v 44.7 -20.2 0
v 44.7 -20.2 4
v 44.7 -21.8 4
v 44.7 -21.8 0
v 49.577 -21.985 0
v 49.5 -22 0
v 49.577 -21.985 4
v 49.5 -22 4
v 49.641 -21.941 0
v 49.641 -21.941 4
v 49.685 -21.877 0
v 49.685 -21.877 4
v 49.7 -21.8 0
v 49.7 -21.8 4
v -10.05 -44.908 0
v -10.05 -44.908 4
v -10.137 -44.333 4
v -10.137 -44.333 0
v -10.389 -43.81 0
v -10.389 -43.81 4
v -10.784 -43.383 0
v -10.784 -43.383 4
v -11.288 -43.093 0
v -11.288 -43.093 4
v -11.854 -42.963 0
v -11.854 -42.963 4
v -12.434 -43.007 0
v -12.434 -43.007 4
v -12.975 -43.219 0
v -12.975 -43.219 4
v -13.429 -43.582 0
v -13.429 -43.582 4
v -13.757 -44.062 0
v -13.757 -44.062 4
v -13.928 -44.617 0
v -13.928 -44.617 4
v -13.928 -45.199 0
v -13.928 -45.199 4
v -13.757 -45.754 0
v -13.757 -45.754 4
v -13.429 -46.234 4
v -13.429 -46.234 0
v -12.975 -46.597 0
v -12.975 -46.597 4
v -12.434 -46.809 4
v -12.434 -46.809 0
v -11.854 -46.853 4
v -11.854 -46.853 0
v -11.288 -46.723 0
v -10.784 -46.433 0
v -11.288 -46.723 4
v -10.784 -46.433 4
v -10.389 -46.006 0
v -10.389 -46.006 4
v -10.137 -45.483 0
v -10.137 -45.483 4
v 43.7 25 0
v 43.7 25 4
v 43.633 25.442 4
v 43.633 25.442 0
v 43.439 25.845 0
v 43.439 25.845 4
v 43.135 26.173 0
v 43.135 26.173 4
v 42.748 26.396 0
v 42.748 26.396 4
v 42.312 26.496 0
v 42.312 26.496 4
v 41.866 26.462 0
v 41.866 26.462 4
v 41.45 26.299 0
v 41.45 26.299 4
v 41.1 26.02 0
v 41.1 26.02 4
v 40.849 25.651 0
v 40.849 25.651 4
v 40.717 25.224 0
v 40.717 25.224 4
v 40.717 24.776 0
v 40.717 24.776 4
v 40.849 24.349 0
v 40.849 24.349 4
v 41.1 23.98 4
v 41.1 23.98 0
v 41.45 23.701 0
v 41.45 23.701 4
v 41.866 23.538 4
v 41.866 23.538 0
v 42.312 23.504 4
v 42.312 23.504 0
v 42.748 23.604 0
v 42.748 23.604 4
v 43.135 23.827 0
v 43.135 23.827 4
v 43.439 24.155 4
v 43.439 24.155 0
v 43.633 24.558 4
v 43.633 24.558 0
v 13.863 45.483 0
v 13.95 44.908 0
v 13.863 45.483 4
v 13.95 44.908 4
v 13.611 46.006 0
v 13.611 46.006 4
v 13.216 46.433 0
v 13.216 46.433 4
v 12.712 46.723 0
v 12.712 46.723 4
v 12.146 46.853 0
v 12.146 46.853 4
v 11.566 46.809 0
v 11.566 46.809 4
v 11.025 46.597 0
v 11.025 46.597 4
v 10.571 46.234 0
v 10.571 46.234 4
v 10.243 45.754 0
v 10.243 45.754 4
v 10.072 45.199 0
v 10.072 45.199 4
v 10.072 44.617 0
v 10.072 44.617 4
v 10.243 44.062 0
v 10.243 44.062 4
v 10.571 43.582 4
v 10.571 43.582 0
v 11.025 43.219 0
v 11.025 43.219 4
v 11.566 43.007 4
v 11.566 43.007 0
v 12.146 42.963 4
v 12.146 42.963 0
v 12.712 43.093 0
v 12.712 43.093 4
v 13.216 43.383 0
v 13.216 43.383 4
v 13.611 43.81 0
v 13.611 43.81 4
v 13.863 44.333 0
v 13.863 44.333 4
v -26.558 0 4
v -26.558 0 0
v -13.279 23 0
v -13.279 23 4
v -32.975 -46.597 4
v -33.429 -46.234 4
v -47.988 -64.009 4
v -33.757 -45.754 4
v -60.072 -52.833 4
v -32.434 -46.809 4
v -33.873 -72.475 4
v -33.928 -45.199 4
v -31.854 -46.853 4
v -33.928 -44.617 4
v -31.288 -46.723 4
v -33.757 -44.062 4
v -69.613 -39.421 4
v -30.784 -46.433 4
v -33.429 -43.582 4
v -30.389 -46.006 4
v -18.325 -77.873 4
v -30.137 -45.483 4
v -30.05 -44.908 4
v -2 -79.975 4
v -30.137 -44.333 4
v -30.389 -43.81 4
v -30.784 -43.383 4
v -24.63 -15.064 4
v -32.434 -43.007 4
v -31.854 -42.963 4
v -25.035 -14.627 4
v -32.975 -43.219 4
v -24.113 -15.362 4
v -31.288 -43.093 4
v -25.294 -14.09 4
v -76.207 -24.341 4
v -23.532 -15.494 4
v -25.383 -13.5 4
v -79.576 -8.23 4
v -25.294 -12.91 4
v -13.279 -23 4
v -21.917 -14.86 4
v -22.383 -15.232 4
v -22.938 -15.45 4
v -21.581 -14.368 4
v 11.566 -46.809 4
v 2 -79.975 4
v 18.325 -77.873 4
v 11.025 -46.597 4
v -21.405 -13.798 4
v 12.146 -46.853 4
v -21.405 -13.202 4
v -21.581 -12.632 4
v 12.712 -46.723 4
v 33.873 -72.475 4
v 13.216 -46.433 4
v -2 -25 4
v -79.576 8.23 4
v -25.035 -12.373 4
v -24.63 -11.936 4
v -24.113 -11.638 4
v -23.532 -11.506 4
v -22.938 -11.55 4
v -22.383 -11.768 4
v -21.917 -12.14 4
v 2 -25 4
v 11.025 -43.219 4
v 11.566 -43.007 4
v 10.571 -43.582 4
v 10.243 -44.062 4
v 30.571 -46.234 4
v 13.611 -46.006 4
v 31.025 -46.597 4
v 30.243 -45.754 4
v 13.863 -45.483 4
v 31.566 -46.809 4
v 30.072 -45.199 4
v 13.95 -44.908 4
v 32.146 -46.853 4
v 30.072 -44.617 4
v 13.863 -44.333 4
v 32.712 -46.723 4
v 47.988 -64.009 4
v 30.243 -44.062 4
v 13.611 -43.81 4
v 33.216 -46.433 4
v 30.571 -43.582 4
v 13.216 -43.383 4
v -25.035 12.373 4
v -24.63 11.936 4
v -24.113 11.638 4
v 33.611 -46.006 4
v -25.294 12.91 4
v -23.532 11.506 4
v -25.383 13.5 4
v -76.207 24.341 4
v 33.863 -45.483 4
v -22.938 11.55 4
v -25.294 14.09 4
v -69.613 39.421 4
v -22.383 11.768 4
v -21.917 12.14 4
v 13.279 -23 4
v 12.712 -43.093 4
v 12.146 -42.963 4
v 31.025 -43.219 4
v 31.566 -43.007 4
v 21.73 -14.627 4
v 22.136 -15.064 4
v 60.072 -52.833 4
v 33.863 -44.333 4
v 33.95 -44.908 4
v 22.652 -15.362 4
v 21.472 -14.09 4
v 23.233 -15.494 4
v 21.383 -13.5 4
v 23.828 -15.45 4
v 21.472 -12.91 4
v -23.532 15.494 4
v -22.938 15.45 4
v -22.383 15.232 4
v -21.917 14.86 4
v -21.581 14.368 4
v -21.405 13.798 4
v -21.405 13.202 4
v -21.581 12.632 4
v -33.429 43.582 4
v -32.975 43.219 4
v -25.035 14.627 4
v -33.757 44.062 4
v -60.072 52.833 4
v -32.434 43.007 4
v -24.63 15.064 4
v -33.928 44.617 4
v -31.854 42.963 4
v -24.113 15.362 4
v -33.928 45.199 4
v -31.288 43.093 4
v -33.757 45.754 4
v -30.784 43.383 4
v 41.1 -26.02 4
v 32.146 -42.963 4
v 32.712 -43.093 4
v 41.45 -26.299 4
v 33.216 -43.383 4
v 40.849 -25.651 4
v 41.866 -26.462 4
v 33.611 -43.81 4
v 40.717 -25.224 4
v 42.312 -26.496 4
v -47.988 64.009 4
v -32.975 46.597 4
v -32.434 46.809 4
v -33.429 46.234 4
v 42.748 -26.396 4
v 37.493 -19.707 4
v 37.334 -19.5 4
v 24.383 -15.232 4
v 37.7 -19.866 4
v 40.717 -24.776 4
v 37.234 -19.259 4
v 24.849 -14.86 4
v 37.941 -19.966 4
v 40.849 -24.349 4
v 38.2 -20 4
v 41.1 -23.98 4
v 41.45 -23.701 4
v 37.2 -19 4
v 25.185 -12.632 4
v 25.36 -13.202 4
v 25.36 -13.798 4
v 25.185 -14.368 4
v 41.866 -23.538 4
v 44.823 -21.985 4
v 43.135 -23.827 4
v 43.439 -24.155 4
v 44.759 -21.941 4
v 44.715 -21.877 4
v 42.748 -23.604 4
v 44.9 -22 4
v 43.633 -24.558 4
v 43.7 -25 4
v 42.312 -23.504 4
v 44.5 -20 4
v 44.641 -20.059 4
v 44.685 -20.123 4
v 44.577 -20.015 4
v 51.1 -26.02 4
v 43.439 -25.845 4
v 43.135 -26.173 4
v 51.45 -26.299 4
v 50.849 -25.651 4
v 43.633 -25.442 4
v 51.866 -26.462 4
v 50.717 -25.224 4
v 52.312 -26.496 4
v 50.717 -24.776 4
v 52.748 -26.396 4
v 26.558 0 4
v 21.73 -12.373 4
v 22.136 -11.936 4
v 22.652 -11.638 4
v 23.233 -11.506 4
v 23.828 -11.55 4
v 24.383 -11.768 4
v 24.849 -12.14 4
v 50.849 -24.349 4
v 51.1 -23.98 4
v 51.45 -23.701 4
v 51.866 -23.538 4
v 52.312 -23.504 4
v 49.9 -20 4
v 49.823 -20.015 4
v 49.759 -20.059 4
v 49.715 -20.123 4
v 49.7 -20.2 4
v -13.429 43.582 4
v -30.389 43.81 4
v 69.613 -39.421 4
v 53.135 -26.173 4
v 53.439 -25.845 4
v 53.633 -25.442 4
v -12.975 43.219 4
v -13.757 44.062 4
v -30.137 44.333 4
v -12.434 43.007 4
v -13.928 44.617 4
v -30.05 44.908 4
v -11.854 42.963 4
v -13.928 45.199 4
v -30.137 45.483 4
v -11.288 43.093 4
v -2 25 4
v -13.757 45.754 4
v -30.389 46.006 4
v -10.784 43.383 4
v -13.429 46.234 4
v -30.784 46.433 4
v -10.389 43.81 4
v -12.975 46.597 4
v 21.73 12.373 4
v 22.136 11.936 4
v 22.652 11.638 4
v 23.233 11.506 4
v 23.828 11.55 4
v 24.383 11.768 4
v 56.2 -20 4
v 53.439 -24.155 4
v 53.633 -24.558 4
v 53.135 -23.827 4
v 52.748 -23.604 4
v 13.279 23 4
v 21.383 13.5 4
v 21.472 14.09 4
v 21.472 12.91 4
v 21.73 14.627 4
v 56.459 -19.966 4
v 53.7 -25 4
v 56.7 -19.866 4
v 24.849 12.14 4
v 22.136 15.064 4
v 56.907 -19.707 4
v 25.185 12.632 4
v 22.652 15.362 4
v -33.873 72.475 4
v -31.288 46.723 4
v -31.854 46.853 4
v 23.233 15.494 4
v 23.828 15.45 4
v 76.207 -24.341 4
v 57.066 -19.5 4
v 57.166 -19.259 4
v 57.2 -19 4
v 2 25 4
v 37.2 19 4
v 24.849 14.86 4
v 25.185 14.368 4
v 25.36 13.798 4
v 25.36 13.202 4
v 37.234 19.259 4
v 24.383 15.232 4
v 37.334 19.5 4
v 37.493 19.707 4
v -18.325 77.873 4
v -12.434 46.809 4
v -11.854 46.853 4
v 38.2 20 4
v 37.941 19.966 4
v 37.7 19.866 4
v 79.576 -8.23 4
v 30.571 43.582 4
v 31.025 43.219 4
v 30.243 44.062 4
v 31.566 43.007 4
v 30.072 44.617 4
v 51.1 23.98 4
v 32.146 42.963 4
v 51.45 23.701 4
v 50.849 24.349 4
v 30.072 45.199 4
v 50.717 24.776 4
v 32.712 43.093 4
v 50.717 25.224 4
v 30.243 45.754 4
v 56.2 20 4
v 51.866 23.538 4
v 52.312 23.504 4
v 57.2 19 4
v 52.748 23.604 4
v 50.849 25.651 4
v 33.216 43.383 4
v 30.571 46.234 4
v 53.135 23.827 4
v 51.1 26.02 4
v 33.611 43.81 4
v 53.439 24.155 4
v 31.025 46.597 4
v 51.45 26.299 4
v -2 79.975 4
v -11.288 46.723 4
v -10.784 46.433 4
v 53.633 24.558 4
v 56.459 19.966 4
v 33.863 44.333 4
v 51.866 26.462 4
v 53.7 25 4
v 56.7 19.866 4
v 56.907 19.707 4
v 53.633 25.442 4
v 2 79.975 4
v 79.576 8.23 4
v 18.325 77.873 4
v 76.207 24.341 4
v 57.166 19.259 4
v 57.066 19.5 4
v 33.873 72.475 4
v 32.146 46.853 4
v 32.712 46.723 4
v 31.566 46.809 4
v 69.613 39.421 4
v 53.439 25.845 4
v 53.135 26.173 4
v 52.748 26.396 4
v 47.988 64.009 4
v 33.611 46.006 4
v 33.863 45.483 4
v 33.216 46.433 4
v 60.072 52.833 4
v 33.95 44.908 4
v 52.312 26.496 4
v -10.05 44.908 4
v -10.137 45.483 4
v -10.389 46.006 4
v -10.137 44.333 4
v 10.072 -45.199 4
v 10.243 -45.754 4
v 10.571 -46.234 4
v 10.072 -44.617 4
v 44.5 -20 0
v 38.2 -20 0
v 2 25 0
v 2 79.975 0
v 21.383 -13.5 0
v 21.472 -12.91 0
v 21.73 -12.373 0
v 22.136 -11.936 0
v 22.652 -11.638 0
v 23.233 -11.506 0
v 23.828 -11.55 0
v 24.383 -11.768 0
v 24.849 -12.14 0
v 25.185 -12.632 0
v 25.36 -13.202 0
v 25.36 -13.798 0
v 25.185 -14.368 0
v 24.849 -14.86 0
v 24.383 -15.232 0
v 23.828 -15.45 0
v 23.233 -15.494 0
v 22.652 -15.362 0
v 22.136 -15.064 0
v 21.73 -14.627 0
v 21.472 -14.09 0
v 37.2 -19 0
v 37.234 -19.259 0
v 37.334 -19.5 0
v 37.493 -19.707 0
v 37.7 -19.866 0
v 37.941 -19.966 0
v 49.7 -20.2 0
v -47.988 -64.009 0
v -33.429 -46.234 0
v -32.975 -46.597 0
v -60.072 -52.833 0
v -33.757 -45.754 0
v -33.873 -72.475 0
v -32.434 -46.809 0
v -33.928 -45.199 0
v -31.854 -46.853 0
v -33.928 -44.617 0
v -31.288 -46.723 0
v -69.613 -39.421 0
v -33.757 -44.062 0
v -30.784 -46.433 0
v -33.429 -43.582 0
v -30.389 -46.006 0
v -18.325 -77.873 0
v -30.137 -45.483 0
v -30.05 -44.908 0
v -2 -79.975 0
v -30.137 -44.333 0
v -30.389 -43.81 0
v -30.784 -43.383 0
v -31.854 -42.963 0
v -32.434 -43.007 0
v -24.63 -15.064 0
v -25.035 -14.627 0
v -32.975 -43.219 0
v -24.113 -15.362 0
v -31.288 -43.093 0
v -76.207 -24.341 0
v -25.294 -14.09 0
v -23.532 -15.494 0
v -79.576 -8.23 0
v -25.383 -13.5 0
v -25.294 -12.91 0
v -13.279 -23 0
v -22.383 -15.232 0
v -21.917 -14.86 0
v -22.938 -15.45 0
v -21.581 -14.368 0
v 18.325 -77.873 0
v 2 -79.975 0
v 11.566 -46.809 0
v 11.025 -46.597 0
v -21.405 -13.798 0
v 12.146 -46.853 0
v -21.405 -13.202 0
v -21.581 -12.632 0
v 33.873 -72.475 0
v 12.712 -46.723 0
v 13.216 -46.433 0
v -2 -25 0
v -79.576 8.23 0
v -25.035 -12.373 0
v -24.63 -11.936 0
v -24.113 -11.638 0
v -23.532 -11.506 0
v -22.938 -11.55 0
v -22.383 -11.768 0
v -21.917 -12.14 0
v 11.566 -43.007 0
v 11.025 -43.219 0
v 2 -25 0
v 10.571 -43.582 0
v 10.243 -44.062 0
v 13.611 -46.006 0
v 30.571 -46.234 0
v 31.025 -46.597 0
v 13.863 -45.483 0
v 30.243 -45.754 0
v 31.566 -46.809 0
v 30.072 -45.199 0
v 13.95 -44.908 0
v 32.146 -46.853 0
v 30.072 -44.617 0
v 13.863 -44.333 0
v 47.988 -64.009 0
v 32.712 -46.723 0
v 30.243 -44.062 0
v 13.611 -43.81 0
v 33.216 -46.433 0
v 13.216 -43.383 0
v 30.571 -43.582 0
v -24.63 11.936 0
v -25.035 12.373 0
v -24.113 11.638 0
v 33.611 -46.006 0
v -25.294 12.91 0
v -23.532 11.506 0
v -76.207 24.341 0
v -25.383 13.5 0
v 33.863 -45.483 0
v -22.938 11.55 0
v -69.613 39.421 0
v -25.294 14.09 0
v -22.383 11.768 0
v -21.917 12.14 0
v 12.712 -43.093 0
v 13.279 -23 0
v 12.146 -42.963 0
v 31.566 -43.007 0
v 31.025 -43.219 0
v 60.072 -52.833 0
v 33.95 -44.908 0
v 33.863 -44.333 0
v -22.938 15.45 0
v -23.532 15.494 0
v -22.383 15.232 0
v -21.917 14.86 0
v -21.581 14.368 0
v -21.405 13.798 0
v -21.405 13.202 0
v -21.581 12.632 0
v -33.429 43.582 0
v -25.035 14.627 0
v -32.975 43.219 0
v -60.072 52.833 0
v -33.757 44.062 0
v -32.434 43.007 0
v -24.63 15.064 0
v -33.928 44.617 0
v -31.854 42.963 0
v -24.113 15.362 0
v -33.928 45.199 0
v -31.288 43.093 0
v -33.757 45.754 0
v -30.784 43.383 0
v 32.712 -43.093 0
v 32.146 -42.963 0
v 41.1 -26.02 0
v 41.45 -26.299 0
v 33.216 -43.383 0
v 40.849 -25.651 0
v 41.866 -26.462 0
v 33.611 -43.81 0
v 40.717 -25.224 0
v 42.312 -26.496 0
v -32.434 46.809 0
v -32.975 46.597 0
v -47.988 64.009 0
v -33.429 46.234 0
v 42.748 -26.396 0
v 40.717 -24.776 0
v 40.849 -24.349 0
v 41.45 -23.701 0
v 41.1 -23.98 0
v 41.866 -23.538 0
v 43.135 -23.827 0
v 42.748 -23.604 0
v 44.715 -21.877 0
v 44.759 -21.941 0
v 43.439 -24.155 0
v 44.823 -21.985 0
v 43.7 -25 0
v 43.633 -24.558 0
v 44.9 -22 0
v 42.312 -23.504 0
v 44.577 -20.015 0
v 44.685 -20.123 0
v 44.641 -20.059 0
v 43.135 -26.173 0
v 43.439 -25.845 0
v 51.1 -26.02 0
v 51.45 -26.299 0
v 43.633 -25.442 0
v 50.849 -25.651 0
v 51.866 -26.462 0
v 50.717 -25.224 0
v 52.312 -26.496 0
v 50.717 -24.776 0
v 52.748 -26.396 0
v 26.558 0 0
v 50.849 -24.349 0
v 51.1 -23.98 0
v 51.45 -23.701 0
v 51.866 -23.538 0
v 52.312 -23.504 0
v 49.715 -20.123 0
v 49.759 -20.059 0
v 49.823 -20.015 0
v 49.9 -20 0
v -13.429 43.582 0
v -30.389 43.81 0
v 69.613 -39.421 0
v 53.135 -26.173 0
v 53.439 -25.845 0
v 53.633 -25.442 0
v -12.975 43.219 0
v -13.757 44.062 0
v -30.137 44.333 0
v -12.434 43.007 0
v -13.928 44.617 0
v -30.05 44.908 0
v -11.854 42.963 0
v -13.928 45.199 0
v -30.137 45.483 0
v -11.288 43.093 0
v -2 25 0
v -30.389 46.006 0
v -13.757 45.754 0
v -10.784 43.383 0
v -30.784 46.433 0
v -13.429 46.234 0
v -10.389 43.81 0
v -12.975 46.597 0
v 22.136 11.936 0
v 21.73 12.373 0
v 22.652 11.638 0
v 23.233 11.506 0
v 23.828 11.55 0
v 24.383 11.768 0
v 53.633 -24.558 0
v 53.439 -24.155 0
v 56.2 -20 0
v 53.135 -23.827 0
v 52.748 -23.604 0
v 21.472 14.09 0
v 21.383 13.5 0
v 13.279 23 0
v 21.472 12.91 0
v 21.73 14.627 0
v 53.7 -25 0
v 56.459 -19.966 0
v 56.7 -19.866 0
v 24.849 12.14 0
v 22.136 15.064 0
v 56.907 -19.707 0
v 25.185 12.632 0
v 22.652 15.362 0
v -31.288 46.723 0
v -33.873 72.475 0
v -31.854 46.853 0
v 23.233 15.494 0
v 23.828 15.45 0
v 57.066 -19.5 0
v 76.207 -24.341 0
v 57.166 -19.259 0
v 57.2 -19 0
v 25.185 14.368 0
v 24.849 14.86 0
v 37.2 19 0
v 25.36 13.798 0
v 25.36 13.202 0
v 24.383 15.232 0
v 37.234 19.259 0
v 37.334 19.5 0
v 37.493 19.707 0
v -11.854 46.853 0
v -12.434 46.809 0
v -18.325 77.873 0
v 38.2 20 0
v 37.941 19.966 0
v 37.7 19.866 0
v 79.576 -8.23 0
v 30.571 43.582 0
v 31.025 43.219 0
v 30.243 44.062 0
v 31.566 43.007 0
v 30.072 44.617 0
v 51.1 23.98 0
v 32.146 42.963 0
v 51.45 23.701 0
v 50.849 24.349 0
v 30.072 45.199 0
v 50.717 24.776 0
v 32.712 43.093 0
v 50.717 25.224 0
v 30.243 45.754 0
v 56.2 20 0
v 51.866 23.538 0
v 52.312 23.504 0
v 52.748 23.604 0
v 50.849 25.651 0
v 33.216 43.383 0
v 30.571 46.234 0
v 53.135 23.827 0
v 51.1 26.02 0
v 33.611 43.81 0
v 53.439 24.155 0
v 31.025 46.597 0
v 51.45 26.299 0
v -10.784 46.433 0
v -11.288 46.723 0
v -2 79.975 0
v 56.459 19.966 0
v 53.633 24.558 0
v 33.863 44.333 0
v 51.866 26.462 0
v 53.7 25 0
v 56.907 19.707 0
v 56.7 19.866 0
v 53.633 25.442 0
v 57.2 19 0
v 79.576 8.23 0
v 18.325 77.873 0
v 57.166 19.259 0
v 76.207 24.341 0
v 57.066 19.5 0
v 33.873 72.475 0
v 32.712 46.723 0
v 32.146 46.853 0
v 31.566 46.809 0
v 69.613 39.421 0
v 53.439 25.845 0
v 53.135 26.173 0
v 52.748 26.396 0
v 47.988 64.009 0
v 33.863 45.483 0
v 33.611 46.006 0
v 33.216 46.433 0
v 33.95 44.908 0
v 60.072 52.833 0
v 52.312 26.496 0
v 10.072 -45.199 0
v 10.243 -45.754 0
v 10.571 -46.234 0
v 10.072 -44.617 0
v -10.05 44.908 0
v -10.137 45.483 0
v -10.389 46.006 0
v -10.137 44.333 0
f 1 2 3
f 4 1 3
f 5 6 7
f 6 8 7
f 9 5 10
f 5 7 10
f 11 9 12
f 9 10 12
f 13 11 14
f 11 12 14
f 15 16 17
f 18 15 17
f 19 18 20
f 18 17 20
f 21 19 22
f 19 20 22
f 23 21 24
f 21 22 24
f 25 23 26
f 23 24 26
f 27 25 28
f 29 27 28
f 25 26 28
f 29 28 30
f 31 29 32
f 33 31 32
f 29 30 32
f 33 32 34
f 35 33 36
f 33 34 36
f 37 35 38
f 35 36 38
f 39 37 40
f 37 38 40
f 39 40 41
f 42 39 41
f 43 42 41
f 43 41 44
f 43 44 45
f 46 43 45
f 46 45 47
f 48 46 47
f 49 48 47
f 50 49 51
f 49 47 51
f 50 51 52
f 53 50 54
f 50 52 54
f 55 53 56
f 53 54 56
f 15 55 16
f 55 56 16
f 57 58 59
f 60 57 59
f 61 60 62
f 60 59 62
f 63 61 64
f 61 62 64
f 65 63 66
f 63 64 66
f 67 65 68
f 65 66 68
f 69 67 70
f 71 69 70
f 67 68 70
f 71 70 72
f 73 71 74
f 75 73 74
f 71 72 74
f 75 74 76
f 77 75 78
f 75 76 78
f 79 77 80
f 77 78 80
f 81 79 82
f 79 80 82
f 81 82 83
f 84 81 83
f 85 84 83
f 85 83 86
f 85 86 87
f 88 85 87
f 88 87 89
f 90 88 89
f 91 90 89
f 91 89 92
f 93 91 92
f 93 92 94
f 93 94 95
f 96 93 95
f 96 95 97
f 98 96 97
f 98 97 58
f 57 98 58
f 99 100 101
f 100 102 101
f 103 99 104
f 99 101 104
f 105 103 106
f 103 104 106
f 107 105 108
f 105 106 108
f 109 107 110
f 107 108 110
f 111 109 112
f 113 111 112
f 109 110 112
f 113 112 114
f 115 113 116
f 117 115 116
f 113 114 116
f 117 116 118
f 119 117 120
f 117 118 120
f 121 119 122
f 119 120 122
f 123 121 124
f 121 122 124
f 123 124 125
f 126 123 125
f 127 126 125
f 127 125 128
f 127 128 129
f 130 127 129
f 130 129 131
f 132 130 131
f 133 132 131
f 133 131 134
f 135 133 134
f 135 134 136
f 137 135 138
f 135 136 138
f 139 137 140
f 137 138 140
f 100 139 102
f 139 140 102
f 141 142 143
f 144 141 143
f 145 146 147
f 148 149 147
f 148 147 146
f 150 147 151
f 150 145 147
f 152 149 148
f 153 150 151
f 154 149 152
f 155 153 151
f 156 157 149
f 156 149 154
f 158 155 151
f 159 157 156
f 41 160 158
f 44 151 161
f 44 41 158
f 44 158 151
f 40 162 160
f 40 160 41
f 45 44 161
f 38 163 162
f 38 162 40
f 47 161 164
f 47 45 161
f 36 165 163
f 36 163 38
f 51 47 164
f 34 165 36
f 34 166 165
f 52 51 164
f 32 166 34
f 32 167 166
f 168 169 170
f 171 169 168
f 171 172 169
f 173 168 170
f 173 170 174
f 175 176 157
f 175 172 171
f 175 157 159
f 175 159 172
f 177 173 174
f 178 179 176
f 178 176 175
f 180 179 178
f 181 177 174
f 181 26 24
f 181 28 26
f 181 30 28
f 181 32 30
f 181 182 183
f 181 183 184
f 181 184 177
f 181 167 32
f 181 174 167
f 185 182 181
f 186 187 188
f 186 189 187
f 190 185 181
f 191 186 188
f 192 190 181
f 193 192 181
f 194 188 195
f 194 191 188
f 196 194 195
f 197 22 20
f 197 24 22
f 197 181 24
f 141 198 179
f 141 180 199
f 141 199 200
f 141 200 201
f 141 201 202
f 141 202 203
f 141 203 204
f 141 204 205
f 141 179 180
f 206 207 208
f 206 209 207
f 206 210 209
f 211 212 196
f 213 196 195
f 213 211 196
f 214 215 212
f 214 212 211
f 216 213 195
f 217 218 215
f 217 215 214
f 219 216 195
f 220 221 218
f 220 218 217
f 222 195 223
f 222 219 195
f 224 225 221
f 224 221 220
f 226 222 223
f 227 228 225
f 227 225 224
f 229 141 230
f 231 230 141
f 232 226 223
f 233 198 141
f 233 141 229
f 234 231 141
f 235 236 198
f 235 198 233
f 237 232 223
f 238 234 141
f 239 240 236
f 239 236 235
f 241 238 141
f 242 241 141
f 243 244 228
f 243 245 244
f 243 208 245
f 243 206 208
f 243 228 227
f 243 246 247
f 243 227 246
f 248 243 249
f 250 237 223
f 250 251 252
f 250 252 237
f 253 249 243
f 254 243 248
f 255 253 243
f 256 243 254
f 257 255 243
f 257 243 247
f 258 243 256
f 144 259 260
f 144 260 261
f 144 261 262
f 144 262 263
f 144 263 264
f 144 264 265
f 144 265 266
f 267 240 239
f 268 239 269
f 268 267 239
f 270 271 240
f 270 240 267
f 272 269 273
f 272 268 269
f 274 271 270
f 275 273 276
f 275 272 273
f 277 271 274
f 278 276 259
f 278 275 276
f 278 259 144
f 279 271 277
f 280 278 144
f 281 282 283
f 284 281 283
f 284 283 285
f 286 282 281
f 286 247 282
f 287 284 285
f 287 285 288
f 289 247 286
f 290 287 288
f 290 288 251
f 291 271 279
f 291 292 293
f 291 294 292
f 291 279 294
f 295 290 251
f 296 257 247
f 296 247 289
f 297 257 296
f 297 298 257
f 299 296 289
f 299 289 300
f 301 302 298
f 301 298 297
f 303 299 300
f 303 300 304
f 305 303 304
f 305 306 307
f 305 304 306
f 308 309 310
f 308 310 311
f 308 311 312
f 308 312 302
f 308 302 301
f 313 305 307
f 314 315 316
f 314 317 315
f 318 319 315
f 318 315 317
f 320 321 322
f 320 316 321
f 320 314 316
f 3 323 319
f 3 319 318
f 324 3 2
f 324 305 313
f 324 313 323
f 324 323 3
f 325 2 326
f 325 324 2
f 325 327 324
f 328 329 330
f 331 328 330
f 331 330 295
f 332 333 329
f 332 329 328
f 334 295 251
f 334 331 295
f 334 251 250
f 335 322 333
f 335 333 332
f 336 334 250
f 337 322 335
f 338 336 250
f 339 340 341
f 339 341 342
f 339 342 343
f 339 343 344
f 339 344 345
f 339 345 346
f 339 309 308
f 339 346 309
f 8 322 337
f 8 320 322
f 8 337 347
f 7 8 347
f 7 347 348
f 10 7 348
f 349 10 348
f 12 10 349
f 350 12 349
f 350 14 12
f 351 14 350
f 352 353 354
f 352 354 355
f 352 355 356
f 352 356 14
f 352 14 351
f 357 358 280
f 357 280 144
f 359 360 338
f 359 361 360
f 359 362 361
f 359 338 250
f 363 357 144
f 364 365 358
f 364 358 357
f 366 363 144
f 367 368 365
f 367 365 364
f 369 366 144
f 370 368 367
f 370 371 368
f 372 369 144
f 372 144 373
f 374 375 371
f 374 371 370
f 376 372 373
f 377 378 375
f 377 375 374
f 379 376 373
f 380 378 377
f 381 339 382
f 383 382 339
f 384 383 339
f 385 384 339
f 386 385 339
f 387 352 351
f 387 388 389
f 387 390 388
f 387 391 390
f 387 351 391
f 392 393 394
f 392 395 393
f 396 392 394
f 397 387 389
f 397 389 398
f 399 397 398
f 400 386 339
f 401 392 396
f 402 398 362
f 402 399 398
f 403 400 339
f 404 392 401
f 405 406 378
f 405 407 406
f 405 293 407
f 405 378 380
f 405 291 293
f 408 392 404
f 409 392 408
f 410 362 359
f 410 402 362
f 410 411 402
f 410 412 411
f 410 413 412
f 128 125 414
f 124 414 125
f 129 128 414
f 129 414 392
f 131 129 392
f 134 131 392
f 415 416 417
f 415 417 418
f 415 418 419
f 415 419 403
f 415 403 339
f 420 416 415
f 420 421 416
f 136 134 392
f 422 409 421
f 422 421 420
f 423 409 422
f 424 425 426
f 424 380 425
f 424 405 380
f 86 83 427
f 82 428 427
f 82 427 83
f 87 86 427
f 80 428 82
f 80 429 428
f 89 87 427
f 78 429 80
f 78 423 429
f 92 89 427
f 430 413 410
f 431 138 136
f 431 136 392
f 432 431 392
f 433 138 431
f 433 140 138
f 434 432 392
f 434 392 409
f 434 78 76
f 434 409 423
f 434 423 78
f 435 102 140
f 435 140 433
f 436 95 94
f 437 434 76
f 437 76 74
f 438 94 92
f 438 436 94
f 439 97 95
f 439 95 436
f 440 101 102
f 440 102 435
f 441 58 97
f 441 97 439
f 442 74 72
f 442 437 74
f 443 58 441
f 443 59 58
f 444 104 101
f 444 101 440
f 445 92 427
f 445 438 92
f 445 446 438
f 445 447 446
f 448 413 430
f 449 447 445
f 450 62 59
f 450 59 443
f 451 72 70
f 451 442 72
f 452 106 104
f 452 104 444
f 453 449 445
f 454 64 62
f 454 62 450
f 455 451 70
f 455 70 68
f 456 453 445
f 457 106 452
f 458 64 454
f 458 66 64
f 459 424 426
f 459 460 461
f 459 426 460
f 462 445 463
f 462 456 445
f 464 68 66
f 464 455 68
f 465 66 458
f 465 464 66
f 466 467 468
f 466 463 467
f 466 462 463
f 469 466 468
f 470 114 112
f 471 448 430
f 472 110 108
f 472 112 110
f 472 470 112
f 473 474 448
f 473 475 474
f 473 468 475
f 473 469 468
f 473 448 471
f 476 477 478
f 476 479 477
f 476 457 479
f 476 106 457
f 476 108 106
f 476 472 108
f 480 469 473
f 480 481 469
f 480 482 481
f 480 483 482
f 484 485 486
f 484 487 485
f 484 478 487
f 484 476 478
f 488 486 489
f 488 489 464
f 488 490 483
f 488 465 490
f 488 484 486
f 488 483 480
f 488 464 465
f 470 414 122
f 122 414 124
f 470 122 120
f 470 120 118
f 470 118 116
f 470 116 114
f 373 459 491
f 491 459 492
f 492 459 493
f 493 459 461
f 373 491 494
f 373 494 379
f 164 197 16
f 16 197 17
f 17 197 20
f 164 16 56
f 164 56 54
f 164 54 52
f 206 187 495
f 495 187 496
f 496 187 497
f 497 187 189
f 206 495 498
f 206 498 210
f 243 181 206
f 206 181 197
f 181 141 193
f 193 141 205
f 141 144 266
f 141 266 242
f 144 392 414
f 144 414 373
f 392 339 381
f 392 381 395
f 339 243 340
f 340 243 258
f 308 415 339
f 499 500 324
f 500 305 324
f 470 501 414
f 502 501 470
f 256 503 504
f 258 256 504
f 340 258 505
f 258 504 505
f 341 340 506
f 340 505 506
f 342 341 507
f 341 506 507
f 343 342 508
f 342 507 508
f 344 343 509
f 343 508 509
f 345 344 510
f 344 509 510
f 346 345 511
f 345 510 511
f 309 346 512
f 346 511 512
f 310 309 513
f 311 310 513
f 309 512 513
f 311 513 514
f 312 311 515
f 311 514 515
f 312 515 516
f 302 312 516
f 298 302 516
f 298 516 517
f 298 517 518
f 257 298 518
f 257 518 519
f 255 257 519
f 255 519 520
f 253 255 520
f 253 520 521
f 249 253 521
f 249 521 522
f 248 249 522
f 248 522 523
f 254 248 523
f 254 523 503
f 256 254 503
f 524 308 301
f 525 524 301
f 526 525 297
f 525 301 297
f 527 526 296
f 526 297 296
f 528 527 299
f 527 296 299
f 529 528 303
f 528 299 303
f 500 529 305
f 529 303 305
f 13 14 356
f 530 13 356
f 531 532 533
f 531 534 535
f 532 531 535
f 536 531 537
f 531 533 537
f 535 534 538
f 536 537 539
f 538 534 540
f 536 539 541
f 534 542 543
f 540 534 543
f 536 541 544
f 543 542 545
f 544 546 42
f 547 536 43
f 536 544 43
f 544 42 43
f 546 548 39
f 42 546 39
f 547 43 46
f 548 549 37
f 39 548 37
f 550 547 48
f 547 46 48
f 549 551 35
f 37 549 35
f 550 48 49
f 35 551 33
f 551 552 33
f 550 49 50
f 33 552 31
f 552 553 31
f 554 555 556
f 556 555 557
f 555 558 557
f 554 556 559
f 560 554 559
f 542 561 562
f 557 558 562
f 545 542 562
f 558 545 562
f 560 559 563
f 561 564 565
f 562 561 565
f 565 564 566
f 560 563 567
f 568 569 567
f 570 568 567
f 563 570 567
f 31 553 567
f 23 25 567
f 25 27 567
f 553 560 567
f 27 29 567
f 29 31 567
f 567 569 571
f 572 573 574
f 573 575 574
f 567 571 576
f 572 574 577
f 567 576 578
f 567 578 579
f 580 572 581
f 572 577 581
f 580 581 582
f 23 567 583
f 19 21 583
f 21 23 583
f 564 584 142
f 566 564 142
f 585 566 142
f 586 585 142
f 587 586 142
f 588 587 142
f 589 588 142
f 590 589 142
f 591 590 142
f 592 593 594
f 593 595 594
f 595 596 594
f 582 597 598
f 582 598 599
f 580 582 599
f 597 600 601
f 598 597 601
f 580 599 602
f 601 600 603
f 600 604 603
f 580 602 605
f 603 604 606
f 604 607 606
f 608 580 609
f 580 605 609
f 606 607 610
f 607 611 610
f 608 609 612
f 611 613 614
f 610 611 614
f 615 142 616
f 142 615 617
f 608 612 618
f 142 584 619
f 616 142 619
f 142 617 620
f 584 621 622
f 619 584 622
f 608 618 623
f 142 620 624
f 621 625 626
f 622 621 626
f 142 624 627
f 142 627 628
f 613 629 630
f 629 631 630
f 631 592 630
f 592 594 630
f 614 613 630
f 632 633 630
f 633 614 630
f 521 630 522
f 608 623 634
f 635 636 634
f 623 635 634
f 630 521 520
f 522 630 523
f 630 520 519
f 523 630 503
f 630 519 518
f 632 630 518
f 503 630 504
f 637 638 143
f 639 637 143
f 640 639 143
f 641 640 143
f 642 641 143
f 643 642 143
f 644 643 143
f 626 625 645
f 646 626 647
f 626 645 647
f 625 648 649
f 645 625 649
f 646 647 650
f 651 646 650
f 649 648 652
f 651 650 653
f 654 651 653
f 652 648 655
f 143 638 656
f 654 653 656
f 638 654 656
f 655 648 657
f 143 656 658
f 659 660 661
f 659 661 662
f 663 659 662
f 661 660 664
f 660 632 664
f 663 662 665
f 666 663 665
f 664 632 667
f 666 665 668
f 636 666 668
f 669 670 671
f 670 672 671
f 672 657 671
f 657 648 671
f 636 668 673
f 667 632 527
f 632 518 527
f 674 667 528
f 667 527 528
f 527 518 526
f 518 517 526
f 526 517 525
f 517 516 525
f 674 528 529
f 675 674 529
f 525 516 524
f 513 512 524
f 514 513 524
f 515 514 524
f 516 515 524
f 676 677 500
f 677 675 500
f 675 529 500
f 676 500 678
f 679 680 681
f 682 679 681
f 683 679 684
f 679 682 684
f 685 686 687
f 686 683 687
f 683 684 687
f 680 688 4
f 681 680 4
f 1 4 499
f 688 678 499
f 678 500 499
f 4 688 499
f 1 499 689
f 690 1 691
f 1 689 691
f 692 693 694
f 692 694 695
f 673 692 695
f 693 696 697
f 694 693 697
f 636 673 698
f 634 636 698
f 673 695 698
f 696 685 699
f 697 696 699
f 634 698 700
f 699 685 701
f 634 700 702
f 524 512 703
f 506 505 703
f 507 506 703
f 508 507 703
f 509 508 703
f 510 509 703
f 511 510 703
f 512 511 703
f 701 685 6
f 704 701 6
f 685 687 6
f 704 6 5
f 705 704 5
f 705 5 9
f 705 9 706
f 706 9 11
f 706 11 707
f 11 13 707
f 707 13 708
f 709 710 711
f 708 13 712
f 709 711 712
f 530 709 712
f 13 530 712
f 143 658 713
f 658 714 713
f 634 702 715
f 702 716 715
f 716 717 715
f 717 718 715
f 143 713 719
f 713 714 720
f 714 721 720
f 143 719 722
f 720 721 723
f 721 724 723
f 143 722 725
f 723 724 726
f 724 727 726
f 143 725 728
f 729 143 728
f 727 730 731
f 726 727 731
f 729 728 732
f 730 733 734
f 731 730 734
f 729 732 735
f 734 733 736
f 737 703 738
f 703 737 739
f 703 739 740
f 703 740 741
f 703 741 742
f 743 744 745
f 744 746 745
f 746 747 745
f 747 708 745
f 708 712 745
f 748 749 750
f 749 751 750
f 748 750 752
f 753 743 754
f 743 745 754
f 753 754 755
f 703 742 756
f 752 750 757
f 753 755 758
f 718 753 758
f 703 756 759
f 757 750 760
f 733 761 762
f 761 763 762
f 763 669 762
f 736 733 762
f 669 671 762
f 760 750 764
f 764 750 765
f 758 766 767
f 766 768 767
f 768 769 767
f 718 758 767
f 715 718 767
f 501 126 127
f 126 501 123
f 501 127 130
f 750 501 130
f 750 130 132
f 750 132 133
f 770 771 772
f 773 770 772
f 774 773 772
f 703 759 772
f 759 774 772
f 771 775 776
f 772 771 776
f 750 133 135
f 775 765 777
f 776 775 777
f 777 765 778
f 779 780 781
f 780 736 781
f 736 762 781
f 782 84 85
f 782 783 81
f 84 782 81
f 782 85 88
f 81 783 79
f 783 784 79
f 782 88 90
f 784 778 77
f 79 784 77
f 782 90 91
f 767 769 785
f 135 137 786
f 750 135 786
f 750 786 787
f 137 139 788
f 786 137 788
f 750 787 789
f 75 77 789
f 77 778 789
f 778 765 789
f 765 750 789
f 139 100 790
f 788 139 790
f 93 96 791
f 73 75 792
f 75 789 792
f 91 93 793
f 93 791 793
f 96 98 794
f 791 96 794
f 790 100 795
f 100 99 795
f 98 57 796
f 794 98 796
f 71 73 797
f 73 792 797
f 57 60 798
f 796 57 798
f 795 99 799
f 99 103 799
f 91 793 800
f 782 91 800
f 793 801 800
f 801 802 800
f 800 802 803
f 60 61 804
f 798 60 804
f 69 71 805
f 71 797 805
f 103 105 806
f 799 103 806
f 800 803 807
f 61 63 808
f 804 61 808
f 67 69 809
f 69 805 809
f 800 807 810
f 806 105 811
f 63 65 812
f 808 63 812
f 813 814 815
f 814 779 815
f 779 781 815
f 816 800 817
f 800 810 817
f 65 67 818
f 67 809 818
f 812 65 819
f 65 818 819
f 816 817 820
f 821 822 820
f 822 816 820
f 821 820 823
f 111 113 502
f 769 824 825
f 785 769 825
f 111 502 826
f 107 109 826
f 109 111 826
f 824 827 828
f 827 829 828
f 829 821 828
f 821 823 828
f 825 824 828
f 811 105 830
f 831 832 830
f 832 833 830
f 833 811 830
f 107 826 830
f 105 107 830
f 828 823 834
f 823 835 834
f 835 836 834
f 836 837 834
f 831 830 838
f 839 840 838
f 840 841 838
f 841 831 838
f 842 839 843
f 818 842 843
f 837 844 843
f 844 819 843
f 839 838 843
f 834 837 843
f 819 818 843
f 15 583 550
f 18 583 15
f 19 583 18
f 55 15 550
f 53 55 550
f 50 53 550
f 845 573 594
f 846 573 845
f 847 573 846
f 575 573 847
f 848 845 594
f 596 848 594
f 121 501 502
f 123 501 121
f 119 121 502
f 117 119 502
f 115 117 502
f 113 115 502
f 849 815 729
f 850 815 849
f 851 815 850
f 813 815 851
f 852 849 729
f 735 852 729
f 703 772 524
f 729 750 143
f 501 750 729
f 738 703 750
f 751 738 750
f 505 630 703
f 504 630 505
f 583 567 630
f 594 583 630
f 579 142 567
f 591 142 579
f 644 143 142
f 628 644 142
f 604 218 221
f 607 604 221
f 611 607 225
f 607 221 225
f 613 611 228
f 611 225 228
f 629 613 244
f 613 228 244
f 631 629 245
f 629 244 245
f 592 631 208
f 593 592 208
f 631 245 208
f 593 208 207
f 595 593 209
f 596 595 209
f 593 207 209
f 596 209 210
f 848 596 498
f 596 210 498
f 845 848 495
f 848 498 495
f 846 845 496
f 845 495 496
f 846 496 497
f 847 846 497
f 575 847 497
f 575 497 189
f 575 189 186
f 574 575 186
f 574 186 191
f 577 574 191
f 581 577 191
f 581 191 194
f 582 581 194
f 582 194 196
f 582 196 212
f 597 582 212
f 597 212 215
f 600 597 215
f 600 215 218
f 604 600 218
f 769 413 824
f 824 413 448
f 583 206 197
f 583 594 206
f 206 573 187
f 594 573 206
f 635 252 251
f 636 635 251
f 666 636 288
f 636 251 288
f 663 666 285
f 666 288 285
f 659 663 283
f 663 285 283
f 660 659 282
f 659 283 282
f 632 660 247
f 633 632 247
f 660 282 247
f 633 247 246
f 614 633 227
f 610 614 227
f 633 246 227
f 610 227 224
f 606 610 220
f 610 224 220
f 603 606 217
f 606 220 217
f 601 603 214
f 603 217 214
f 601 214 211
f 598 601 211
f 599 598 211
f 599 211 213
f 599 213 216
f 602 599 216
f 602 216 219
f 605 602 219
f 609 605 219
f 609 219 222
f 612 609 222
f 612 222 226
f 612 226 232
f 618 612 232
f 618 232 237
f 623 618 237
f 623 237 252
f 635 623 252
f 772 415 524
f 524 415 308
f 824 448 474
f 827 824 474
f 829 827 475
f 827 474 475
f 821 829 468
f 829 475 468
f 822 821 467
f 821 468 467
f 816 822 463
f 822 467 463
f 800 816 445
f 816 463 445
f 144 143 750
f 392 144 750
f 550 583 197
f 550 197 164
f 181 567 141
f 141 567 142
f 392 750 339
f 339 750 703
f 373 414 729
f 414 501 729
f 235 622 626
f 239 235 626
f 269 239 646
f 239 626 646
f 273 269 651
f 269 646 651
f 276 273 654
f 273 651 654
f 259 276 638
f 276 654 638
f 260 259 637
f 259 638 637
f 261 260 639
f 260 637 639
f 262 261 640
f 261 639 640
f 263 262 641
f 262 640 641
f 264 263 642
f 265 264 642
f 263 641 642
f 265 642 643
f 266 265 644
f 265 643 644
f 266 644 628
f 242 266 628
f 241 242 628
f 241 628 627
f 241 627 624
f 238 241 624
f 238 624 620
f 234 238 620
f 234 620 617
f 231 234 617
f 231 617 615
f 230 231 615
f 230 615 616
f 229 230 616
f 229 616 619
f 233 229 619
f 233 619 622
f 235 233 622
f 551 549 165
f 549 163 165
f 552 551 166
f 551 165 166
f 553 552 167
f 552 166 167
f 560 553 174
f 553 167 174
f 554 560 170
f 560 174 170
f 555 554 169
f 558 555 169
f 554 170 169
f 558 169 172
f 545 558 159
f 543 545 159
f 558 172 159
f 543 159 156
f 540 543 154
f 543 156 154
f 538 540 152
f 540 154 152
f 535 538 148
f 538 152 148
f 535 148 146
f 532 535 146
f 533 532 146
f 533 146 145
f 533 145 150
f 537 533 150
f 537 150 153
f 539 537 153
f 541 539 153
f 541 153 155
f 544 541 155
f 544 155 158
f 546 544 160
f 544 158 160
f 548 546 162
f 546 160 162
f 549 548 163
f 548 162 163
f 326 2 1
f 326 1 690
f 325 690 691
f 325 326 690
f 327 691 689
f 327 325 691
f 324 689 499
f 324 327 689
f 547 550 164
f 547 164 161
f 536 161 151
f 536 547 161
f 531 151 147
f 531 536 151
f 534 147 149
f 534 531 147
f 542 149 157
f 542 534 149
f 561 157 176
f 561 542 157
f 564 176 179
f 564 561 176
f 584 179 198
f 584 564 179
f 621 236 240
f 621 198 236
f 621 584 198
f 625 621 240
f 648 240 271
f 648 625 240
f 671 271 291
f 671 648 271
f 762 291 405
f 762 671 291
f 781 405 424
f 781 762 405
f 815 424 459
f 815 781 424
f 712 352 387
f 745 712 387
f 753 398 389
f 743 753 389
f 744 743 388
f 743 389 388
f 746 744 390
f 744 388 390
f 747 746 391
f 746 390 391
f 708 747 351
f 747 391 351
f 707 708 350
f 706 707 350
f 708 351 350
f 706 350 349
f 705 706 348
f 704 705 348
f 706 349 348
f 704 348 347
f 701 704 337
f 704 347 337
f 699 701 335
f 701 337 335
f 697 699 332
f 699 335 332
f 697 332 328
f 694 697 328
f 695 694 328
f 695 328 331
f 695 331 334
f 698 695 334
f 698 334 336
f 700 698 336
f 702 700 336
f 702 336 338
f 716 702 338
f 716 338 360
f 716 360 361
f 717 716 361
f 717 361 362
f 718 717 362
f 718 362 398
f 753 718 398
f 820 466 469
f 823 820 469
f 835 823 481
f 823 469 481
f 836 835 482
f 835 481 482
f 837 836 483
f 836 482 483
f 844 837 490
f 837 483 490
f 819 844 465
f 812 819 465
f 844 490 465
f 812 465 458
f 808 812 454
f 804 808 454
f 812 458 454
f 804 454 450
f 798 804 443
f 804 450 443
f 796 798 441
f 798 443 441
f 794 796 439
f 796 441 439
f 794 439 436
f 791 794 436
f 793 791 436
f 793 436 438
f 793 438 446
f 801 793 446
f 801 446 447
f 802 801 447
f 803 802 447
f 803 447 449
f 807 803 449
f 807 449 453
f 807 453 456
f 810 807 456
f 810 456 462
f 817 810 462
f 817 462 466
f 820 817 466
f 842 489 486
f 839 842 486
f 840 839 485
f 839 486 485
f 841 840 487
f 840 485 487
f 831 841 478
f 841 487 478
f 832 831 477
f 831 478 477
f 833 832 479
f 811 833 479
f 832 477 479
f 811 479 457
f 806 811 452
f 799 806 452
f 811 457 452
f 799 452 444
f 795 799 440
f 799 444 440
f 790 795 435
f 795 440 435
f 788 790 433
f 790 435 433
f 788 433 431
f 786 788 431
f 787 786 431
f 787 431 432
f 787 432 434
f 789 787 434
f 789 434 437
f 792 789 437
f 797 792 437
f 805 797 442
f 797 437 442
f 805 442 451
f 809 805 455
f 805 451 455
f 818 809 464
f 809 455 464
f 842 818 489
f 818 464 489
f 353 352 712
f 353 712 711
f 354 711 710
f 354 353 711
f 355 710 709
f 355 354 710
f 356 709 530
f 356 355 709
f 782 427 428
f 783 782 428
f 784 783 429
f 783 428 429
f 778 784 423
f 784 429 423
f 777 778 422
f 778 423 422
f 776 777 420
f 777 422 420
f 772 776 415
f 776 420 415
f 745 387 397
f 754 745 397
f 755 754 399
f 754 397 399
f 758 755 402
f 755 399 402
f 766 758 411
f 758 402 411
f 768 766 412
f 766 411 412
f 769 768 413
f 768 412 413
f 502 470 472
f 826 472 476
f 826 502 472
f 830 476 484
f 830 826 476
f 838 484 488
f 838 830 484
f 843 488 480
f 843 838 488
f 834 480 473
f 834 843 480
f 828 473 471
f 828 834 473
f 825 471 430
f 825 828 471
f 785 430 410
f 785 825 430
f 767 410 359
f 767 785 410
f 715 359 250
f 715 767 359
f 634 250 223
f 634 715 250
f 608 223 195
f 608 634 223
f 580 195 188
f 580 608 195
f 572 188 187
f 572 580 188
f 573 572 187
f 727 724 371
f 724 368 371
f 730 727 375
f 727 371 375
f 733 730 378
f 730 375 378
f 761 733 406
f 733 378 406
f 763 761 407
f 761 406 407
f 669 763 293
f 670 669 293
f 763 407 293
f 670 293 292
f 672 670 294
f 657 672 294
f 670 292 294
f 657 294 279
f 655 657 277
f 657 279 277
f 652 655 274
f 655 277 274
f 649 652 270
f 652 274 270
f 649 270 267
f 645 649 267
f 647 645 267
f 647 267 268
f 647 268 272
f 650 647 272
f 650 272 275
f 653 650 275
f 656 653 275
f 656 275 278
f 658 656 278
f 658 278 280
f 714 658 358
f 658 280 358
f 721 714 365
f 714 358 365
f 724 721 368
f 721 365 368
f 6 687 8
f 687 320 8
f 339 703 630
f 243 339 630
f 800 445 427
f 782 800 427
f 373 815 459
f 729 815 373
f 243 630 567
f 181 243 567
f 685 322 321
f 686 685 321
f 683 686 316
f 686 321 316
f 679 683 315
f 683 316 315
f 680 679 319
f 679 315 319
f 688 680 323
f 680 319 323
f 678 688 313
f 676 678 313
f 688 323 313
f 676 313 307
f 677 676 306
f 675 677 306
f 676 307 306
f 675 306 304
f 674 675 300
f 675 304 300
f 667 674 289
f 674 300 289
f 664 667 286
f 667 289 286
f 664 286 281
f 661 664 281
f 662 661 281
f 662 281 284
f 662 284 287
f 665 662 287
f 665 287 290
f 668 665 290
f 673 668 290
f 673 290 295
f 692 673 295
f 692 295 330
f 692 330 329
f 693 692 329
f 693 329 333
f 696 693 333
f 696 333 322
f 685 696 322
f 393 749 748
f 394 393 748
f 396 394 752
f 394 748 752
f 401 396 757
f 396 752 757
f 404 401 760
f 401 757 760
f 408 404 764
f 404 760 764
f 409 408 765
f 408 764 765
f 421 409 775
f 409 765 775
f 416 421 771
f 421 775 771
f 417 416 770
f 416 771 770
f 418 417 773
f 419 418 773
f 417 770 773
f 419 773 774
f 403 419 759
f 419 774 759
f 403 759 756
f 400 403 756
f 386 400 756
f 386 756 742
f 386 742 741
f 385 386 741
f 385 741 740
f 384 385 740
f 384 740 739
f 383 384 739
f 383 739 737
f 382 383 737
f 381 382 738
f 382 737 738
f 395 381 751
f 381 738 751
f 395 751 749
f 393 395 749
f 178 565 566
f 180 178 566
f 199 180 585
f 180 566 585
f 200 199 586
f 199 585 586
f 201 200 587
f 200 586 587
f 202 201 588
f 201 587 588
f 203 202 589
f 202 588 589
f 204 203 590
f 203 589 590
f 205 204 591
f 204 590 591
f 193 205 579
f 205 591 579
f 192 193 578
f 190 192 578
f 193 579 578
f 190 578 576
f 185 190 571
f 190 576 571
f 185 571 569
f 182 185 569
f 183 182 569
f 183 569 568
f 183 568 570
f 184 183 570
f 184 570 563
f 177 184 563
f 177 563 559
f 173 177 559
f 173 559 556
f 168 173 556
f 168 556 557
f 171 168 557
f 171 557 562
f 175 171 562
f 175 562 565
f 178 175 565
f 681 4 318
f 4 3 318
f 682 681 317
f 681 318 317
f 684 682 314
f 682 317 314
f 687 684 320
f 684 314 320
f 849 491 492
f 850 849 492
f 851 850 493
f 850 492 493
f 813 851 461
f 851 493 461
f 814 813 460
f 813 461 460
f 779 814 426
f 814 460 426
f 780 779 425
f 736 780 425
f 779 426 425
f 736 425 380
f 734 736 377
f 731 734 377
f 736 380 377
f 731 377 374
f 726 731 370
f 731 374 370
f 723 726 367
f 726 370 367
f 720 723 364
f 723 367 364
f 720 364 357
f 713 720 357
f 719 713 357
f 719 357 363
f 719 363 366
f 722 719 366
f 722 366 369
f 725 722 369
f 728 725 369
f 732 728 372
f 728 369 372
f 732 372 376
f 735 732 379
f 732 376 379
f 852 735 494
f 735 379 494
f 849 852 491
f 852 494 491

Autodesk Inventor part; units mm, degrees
ref_plane "YZ Plane" through (0, 0, 0) normal (1, 0, 0) x (0, 1, 0)
ref_plane "XZ Plane" through (0, 0, 0) normal (0, 1, 0) x (-1, 0, 0)
ref_plane "XY Plane" through (0, 0, 0) normal (0, 0, 1) x (1, 0, 0)
sketch "Эскиз1" plane through (0, 0, 0) normal (0, 0, 1) x (1, 0, 0)
  circle A0 centre (0, 0) radius 80
  line L0 (26.5581, 0) -> (13.2791, -23)
  line L1 (13.2791, -23) -> (-13.2791, -23)
  line L2 (-13.2791, -23) -> (-26.5581, 0)
  line L3 (-26.5581, 0) -> (-13.2791, 23)
  line L4 (-13.2791, 23) -> (13.2791, 23)
  line L5 (13.2791, 23) -> (26.5581, 0)
  dimension "d49" = 160
  dimension "d50" = 46
extrude "Выдавливание1" add sketch "Эскиз1" along normal blind 4
sketch "Эскиз2" plane through (0, 0, 0) normal (0, 0, -1) x (-1, 0, 0)
  circle A0 centre (0, 0) radius 80 projected
  line L0 (0, 80) -> (0, -80) construction
  line L1 (2, -80) -> (-2, -80)
  line L2 (-2, -80) -> (-2, 80)
  line L3 (-2, 80) -> (2, 80)
  line L4 (2, 80) -> (2, -80)
  line L5 (2, -80) -> (-2, 80) construction
  line L6 (-2, -80) -> (2, 80) construction
  line L7 (-2, 25) -> (2, 25)
  line L8 (-2, -25) -> (2, -25)
  point P0 (0, -25)
  point P1 (0, 80)
  point P2 (0, 25)
  dimension "d2" = 4
  dimension "d3" = 160
  dimension "d4" = 55
  dimension "d5" = 55
extrude "Выдавливание2" cut sketch "Эскиз2" against normal blind 10 contours L4 L7 L2 A0 | A0 L3 L4 | L4 L1 A0 | A0 L2 L8 L4 | A0 L2 L3 | L1 L2 A0
sketch "Эскиз4" plane through (0, 0, 4) normal (0, 0, 1) x (1, 0, 0)
  line L0 (56.2, 20) -> (38.2, 20)
  line L1 (37.2, 19) -> (37.2, -19)
  line L2 (57.2, -19) -> (57.2, 19)
  arc A0 (38.2, 20) -> (37.2, 19) centre (38.2, 19) ccw
  arc A1 (37.2, -19) -> (38.2, -20) centre (38.2, -19) ccw
  arc A2 (56.2, -20) -> (57.2, -19) centre (56.2, -19) ccw
  arc A3 (57.2, 19) -> (56.2, 20) centre (56.2, 19) ccw
  line L3 (44.9, -22) -> (49.5, -22)
  line L4 (49.7, -21.8) -> (49.7, -20.2)
  line L5 (49.7, -20) -> (47.2, -20) construction
  line L6 (44.7, -20.2) -> (44.7, -21.8)
  line L7 (49.7, -20) -> (44.7, -22) construction
  line L8 (47.2, -21) -> (47.2, -20) construction
  line L9 (0, 0) -> (112.2307, 0) construction
  line L10 (56.9071, 19.7071) -> (37.4929, -19.7071) construction
  line L11 (37.4929, 19.7071) -> (56.9071, -19.7071) construction
  line L12 (47.2, 20) -> (47.2, -20) construction
  line L13 (38.2, -20) -> (44.5, -20)
  line L14 (49.9, -20) -> (56.2, -20)
  arc A4 (49.9, -20) -> (49.7, -20.2) centre (49.9, -20.2) ccw
  arc A5 (44.7, -20.2) -> (44.5, -20) centre (44.5, -20.2) ccw
  arc A6 (44.7, -21.8) -> (44.9, -22) centre (44.9, -21.8) ccw
  arc A7 (49.5, -22) -> (49.7, -21.8) centre (49.5, -21.8) ccw
  line L15 (0, 0) -> (0, 111.2909) construction
  line L16 (47.2, -20) -> (47.2, -24.7856) construction
  point P0 (47.3361, 0)
  point P1 (49.7, -22)
  point P2 (44.7, -20)
  point P3 (47.2, 0)
  dimension "d35" = 1
  dimension "d40" = 5
  dimension "d41" = 2
  dimension "d42" = 20
  dimension "d44" = 37.2
  dimension "d45" = 0.2
  dimension "d46" = 38
extrude "Выдавливание4" cut sketch "Эскиз4" against normal blind 10
sketch "Эскиз6" plane through (0, 0, 4) normal (0, 0, 1) x (1, 0, 0)
  circle A0 centre (42.2, -25) radius 1.5
  circle A1 centre (52.2, -25) radius 1.5
  line L0 (42.2, -25) -> (52.2, -25) construction
  line L1 (52.2, -25) -> (52.2, 25) construction
  line L2 (52.2, 25) -> (42.2, 25) construction
  line L3 (42.2, 25) -> (42.2, -25) construction
  line L4 (42.2, -25) -> (52.2, 25) construction
  circle A2 centre (42.2, 25) radius 1.5
  circle A3 centre (52.2, 25) radius 1.5
  arc A4 (38.2, 20) -> (37.2, 19) centre (38.2, 19) ccw projected
  arc A5 (56.2, -20) -> (57.2, -19) centre (56.2, -19) ccw projected
  line L5 (38.2, 19) -> (56.2, -19) construction
  point P0 (0, 0)
  point P1 (47.2, 0)
  dimension "d15" = 3
  dimension "d16" = 50
  dimension "d17" = 10
  dimension "d20" = 3
  dimension "d21" = 3
  dimension "d22" = 3
extrude "Выдавливание5" cut sketch "Эскиз6" against normal blind 10
sketch "Эскиз8" plane through (0, 0, 4) normal (0, 0, 1) x (1, 0, 0)
  circle A0 centre (-32, 44.908) radius 2.55 construction
  circle A1 centre (-12, 44.908) radius 2.55 construction
  circle A2 centre (12, 44.908) radius 2.55 construction
  circle A3 centre (32, 44.908) radius 2.55 construction
  circle A4 centre (32, -44.908) radius 2.55 construction
  circle A5 centre (12, -44.908) radius 2.55 construction
  circle A6 centre (-32, -44.908) radius 2.55 construction
  circle A7 centre (-12, -44.908) radius 2.55 construction
  circle A8 centre (-32, 44.908) radius 1.95
  circle A9 centre (-12, 44.908) radius 1.95
  circle A10 centre (12, 44.908) radius 1.95
  circle A11 centre (32, 44.908) radius 1.95
  circle A12 centre (-32, -44.908) radius 1.95
  circle A13 centre (-12, -44.908) radius 1.95
  circle A14 centre (12, -44.908) radius 1.95
  circle A15 centre (32, -44.908) radius 1.95
  point P0 (0, 0)
  dimension "d23" = 3.9
  dimension "d24" = 3.9
  dimension "d25" = 3.9
  dimension "d26" = 3.9
  dimension "d27" = 3.9
  dimension "d28" = 3.9
  dimension "d29" = 3.9
  dimension "d30" = 3.9
extrude "Выдавливание6" cut sketch "Эскиз8" against normal blind 10
sketch "Эскиз9" plane through (0, 0, 0) normal (0, 0, -1) x (-1, 0, 0)
  circle A0 centre (-23.3827, -13.5) radius 2 projected
  circle A1 centre (-23.3827, 13.5) radius 2 projected
  circle A2 centre (23.3827, 13.5) radius 2 projected
  circle A3 centre (23.3827, -13.5) radius 2 projected
extrude "Выдавливание7" cut sketch "Эскиз9" against normal blind 10
properties part number "лицо1"
